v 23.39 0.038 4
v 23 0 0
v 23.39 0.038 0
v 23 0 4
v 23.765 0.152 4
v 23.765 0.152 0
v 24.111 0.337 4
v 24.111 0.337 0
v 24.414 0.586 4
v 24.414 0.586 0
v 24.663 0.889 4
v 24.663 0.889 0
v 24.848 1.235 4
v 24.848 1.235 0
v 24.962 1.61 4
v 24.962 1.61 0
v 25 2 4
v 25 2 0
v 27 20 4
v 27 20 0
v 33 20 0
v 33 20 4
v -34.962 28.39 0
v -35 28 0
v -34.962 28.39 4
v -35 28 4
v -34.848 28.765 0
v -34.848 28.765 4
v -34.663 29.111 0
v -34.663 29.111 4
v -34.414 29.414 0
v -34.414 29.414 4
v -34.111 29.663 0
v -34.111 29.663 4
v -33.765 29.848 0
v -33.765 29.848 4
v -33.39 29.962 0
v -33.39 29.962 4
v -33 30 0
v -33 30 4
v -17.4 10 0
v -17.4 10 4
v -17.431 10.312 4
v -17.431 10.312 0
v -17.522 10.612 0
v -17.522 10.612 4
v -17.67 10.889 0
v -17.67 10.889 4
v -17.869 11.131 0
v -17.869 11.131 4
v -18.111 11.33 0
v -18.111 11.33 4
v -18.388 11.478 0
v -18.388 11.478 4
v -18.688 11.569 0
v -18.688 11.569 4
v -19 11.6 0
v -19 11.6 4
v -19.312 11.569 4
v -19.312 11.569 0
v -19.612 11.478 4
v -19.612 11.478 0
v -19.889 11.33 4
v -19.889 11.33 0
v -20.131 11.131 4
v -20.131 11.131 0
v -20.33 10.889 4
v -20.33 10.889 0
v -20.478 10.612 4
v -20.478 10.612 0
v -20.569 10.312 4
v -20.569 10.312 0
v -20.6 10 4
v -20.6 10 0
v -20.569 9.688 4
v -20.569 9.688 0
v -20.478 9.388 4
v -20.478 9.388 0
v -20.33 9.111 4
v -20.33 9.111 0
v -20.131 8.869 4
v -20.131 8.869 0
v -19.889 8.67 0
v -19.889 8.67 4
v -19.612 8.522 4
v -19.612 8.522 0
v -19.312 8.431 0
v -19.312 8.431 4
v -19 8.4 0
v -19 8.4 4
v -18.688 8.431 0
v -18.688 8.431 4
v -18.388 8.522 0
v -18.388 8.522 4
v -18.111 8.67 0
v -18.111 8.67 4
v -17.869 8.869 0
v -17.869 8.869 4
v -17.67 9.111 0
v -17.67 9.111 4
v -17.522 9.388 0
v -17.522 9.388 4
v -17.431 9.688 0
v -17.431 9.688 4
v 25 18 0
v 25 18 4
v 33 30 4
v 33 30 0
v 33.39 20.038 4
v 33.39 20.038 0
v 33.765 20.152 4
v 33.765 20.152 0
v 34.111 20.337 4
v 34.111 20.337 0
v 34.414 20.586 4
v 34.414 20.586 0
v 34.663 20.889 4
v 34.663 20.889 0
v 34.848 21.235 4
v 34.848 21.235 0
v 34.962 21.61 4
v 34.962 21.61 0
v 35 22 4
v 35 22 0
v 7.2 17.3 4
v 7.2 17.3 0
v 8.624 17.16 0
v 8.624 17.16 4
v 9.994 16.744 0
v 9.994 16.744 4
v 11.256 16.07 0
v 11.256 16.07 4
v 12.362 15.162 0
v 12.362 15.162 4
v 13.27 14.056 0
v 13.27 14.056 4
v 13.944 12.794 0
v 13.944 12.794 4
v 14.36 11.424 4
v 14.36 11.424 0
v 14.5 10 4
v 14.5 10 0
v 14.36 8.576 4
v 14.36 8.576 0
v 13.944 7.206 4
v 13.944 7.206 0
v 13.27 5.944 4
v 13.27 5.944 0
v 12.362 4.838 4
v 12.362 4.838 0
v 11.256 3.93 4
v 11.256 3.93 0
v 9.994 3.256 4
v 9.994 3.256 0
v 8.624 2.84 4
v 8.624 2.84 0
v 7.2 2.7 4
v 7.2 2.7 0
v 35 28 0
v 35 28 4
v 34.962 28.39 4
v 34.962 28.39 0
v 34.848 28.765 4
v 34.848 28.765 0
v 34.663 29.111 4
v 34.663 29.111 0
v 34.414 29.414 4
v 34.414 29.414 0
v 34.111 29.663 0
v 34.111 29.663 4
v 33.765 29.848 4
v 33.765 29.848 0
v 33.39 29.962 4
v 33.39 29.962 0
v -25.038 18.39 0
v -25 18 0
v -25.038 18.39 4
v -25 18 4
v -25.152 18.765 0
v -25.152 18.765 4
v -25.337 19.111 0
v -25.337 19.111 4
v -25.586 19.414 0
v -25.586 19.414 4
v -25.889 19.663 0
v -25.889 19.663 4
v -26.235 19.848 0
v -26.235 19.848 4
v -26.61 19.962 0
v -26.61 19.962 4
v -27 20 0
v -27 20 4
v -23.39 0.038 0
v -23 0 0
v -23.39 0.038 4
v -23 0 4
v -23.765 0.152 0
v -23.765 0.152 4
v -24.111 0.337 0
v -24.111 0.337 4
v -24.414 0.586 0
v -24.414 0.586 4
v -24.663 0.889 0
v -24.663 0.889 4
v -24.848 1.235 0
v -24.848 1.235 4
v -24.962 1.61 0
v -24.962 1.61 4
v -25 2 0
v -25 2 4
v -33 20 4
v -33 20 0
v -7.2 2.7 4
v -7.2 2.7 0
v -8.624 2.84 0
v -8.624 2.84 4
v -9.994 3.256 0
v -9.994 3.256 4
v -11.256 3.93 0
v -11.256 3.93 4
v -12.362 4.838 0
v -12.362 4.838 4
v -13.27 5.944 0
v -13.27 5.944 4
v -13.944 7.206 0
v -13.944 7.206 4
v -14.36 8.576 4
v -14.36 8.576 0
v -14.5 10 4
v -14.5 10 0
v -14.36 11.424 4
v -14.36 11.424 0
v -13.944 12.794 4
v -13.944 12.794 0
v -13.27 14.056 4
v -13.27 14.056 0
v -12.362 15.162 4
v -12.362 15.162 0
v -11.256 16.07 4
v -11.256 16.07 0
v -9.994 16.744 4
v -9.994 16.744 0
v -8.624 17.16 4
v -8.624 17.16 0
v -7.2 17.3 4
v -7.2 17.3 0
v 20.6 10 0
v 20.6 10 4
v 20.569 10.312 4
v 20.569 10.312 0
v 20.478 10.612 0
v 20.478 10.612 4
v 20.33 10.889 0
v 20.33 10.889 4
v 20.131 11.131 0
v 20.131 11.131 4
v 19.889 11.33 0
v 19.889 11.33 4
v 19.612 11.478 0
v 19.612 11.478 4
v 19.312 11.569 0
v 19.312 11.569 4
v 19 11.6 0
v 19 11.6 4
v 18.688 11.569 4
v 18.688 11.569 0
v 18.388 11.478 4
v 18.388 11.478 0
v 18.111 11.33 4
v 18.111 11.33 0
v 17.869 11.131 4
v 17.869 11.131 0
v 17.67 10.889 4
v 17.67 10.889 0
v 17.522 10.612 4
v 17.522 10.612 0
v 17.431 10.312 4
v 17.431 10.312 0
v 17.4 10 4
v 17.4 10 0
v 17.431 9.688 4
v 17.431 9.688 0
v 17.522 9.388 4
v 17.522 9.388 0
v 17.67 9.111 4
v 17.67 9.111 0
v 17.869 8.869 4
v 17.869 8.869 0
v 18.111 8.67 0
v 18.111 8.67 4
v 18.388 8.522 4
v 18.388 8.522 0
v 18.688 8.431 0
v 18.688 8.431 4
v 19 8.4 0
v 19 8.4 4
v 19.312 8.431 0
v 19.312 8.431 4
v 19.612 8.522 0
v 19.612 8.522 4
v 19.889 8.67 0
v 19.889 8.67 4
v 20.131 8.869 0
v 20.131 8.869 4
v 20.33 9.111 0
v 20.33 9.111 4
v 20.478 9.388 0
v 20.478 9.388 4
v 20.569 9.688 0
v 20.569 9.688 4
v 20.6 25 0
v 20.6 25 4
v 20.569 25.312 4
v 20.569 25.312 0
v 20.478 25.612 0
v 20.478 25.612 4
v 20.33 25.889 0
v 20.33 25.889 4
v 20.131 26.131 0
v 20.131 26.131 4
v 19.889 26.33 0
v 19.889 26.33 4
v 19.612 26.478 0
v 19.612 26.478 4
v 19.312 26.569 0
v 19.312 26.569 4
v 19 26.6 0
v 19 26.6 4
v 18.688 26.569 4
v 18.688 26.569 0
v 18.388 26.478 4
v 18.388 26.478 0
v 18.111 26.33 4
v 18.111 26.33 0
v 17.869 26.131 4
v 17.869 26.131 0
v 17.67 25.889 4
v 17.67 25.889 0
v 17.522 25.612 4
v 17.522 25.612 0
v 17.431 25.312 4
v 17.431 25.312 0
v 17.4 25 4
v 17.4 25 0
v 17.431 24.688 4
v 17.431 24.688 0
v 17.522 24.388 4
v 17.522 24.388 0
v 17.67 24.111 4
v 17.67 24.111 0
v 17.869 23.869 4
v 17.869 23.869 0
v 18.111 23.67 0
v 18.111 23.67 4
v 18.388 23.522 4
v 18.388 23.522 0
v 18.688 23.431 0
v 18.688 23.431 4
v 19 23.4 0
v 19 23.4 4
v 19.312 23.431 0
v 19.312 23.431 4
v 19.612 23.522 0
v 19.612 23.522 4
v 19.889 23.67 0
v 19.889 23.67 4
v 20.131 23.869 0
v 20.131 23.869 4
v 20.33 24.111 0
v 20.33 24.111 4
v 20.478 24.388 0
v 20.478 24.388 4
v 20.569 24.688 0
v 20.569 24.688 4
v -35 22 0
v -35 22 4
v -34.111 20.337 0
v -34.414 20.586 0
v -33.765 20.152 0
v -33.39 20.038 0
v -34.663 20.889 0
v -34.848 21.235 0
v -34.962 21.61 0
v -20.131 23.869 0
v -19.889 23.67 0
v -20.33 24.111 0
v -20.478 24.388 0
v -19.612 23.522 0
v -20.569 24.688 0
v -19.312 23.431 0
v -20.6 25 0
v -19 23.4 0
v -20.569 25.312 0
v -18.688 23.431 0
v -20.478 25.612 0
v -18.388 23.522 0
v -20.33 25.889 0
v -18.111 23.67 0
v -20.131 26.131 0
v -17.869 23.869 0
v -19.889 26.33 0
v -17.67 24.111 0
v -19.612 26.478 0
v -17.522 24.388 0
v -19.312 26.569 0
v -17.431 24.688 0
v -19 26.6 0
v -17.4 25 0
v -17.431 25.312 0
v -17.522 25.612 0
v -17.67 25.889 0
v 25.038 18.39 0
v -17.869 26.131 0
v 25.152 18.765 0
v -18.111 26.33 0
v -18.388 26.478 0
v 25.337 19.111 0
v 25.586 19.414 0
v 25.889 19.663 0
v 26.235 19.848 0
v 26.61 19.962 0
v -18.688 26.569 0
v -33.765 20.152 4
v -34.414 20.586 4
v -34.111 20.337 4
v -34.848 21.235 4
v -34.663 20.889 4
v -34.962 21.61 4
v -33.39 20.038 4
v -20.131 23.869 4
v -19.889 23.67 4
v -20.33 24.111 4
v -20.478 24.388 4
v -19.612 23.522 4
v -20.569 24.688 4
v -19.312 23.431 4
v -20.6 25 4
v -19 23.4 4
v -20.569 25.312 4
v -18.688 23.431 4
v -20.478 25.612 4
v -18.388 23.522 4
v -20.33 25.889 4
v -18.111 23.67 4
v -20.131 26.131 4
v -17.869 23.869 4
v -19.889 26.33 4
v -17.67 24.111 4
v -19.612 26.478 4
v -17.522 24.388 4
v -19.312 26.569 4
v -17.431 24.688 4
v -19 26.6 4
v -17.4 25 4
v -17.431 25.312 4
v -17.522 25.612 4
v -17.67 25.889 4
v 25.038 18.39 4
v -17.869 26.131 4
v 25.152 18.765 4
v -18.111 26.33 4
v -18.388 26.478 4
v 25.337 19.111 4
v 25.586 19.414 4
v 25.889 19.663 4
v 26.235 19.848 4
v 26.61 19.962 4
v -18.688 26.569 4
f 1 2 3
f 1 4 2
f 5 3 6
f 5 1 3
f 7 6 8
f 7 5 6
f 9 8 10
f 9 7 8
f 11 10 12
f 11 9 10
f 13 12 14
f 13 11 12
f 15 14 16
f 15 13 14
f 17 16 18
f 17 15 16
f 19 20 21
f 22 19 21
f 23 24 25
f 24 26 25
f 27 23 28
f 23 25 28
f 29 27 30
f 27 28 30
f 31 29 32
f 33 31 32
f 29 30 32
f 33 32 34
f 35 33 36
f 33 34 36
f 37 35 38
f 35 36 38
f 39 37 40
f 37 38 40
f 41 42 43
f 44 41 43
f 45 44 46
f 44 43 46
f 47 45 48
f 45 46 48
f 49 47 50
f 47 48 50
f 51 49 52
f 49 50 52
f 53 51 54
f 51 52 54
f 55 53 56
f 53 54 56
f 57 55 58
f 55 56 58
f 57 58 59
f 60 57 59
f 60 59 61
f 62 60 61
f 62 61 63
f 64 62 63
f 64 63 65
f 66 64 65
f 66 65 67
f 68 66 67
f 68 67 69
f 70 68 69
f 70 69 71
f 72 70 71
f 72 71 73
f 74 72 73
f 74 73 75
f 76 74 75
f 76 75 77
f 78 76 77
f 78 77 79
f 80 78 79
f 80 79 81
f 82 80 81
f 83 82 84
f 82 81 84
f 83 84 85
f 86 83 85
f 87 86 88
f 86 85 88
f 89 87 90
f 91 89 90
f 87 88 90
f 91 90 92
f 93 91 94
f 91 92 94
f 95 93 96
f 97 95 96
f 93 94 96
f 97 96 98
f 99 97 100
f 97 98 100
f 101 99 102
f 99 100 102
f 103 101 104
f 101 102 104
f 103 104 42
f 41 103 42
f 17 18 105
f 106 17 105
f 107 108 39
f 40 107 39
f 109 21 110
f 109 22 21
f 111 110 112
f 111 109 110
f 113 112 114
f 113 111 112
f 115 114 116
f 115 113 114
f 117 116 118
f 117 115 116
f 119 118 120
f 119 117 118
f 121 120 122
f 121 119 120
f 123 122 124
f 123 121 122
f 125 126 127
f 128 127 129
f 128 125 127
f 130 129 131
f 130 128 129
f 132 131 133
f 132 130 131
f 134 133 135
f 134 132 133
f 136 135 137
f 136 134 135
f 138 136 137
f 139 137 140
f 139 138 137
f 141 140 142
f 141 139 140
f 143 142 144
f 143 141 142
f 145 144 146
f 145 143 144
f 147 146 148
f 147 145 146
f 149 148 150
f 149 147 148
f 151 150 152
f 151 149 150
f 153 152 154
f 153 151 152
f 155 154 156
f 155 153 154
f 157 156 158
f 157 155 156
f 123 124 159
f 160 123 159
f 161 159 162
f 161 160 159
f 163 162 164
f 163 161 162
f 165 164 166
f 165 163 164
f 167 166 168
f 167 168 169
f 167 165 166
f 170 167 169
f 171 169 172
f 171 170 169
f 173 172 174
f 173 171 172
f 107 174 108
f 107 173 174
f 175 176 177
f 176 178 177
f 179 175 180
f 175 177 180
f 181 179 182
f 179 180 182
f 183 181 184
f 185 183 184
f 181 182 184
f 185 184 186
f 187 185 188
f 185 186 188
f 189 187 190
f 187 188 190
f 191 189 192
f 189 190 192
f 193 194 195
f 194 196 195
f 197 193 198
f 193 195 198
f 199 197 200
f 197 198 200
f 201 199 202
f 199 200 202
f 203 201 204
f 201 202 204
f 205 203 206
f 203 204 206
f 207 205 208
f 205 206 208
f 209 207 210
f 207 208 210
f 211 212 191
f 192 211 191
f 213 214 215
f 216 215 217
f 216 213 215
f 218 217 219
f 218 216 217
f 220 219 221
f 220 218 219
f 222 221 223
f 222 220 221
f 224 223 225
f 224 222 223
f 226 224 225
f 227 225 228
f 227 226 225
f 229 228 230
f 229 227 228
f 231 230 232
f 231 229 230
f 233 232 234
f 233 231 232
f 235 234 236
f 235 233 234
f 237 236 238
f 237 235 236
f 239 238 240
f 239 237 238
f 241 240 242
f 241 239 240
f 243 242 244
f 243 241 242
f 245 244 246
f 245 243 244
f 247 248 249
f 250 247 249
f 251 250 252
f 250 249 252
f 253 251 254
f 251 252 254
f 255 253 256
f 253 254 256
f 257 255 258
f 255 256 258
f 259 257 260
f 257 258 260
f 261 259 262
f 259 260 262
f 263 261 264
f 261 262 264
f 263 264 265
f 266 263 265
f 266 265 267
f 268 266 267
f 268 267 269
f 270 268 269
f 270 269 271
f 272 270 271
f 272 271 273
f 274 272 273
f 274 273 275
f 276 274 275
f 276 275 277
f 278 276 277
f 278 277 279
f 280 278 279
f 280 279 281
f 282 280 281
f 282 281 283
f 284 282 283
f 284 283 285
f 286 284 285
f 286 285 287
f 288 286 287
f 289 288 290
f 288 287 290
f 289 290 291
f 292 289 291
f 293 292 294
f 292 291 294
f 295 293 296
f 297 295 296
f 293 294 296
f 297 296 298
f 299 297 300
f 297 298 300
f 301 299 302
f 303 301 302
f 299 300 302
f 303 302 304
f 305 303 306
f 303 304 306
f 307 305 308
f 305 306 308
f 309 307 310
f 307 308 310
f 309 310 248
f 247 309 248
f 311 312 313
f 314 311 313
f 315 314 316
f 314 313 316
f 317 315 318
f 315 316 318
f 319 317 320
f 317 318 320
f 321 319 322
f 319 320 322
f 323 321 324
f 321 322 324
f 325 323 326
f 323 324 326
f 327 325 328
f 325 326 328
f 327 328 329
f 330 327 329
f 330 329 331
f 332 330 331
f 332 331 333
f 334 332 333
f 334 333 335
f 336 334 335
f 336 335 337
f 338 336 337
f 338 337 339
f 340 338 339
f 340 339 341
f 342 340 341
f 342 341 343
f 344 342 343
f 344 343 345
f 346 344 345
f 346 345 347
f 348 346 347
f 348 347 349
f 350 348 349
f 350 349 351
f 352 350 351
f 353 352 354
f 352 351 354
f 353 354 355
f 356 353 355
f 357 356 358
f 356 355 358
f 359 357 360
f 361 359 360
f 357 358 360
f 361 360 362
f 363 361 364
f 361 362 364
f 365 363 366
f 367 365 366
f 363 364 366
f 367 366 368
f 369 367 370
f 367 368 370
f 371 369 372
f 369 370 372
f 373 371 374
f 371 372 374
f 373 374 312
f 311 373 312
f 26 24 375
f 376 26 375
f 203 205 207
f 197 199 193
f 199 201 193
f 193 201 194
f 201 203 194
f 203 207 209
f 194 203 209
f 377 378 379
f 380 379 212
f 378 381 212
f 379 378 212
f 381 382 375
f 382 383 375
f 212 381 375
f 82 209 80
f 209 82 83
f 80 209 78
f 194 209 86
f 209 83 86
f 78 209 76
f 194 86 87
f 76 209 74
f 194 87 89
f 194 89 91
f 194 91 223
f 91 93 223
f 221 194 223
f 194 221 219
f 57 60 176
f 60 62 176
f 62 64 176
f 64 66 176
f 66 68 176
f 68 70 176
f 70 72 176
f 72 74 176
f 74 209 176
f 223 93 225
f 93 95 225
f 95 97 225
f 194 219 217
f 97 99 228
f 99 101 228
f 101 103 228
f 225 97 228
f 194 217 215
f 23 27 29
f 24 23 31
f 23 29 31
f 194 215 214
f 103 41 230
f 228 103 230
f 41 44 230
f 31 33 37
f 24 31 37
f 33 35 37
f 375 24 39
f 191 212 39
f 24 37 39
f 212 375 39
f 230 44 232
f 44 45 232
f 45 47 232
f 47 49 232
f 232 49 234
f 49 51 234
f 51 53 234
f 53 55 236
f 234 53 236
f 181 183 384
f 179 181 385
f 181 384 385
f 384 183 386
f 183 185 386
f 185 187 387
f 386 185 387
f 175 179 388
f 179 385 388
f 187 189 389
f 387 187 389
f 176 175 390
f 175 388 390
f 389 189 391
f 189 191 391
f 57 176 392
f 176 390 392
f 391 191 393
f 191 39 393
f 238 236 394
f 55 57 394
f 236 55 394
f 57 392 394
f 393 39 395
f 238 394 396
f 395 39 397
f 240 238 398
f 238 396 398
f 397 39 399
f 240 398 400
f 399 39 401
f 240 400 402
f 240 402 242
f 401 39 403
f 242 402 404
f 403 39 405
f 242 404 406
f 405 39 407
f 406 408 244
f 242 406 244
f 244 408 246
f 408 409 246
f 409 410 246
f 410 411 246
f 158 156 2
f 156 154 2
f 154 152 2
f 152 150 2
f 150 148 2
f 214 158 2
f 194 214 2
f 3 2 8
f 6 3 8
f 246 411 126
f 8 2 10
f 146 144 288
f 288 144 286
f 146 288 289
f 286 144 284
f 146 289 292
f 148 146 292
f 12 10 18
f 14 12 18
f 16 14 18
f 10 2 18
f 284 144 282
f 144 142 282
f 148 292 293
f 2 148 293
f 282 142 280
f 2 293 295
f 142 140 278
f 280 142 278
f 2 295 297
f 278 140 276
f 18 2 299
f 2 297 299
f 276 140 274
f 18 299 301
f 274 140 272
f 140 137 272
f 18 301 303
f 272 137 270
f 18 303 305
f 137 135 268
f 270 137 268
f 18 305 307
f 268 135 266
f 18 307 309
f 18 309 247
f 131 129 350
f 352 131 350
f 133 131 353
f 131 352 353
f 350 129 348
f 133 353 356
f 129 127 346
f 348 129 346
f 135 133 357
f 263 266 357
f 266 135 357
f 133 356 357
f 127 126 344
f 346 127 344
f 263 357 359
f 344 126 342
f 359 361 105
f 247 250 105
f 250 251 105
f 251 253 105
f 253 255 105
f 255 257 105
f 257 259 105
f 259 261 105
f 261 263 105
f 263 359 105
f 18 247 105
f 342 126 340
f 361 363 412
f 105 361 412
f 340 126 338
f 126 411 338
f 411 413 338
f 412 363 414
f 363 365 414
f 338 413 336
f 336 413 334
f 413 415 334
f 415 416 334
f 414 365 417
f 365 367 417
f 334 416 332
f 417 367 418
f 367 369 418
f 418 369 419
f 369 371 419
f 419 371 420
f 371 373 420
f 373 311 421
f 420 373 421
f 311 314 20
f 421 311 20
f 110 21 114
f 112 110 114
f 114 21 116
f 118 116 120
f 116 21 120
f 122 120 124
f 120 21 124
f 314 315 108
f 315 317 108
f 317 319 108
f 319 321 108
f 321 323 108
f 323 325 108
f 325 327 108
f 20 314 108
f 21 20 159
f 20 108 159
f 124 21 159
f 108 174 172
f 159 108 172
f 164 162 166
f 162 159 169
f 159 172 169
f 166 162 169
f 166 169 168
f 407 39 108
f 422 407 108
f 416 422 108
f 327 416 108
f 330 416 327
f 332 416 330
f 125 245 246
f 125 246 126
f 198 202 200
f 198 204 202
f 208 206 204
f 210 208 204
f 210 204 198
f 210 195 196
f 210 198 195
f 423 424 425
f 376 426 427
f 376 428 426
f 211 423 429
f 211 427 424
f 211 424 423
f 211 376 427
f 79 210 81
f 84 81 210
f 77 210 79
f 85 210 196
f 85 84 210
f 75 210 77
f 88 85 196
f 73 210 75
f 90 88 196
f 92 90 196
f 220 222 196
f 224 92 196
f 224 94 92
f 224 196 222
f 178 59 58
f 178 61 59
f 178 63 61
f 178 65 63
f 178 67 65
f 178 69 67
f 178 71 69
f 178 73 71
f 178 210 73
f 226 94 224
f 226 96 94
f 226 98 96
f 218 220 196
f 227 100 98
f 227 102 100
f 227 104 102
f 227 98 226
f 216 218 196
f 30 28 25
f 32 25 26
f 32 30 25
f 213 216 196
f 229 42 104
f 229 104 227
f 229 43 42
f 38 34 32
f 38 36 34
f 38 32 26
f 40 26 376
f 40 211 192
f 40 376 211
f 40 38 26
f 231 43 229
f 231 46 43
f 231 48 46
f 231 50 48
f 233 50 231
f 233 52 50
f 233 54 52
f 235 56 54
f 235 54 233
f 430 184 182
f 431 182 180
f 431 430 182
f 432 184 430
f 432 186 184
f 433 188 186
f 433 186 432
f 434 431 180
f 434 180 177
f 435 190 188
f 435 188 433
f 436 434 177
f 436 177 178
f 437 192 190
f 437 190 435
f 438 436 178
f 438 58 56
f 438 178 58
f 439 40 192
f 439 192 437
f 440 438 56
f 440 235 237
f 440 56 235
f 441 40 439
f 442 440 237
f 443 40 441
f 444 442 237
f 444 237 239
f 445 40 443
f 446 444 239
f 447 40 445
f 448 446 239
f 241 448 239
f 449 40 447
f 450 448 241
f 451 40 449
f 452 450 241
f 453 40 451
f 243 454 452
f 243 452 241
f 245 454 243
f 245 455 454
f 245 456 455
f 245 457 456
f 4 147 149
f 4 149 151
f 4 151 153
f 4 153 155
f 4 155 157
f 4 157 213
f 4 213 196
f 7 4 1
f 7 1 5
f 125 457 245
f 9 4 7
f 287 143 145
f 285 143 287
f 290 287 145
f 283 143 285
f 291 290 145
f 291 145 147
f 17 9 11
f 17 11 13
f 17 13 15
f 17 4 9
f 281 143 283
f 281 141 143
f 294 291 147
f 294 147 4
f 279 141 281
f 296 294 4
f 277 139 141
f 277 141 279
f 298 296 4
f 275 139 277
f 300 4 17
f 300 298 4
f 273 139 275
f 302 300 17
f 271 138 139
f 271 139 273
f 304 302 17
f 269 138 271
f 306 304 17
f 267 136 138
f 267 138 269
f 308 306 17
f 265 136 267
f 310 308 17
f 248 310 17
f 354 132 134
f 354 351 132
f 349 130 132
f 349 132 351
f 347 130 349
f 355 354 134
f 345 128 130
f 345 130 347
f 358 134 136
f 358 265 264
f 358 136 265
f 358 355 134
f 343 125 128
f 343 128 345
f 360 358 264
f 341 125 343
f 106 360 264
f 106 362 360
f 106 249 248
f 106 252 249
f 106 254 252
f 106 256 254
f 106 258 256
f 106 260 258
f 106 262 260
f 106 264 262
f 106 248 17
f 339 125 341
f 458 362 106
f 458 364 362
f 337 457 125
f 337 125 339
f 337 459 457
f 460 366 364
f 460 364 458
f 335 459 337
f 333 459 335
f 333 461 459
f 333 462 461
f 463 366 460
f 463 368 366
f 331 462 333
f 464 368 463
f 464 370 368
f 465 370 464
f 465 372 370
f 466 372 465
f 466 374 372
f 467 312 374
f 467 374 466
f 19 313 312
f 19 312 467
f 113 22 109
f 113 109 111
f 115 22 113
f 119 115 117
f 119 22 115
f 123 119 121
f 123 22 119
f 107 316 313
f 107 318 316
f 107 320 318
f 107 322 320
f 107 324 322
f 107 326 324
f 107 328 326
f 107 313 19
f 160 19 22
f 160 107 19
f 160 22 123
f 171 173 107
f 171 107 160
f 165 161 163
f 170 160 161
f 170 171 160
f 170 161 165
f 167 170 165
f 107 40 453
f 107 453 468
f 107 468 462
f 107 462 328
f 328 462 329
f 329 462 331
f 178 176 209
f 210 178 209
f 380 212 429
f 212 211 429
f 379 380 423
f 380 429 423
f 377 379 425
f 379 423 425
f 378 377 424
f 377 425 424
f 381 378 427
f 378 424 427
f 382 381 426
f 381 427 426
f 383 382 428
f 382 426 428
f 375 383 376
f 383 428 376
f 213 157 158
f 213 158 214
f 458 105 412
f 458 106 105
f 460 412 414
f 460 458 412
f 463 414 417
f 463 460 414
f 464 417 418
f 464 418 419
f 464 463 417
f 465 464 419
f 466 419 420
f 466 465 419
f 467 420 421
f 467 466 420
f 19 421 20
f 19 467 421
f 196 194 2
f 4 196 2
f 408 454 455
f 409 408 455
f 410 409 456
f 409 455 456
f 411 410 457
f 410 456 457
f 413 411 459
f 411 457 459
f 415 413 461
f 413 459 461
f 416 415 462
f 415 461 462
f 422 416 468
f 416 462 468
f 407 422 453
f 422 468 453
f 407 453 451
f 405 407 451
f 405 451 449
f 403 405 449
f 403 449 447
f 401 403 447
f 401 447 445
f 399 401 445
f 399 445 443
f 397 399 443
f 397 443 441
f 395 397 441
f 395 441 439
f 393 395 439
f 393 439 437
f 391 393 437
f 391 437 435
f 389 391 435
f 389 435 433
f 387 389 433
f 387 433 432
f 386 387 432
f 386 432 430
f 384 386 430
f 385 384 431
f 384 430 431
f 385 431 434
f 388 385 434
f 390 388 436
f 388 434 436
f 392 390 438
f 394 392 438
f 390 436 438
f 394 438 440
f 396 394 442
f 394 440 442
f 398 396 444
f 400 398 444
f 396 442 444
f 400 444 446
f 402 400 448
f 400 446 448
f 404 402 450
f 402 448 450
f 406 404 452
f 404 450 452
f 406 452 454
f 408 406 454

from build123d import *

# Parameters (mm, degrees)
EXTRUDE_1_DEPTH     = 4
SKETCH_2_R          = 1.6
CUT_EXTRUDE_1_DEPTH = 5
CUT_EXTRUDE_2_DEPTH = 5
FILLET_1_R          = 2


with BuildPart() as part:
    # 草图1 → 凸台-拉伸1 (new body)
    with BuildSketch(Plane.XY):
        Polygon((-25, 0), (25, 0), (25, 20), (35, 20), (35, 30), (-35, 30), (-35, 20), (-25, 20), align=None)
    extrude(amount=EXTRUDE_1_DEPTH)

    # 草图2 → 切除-拉伸1 (cut, through all)
    with BuildSketch(Plane.XY.offset(4)):
        with Locations((19, 10)):
            Circle(SKETCH_2_R)
        with Locations((19, 25)):
            Circle(SKETCH_2_R)
        with Locations((-19, 10)):
            Circle(SKETCH_2_R)
        with Locations((-19, 25)):
            Circle(SKETCH_2_R)
    extrude(amount=-CUT_EXTRUDE_1_DEPTH, mode=Mode.SUBTRACT)

    # 草图3 → 切除-拉伸2 (cut, through all)
    with BuildSketch(Plane.XY.offset(4)):
        with BuildLine():
            Line((-7.2, 17.3), (7.2, 17.3))
            ThreePointArc((7.2, 17.3), (14.5, 10), (7.2, 2.7))
            Line((7.2, 2.7), (-7.2, 2.7))
            ThreePointArc((-7.2, 2.7), (-14.5, 10), (-7.2, 17.3))
        make_face()
    extrude(amount=-CUT_EXTRUDE_2_DEPTH, mode=Mode.SUBTRACT)

    # 圆角1
    fillet_1_edges = [part.edges().sort_by_distance(p)[0] for p in [
        (-25, 20, 2),
        (-35, 20, 2),
        (-35, 30, 2),
        (35, 30, 2),
        (35, 20, 2),
        (25, 20, 2),
        (25, 0, 2),
        (-25, 0, 2),
    ]]
    fillet(fillet_1_edges, radius=FILLET_1_R)


solid = part.part
